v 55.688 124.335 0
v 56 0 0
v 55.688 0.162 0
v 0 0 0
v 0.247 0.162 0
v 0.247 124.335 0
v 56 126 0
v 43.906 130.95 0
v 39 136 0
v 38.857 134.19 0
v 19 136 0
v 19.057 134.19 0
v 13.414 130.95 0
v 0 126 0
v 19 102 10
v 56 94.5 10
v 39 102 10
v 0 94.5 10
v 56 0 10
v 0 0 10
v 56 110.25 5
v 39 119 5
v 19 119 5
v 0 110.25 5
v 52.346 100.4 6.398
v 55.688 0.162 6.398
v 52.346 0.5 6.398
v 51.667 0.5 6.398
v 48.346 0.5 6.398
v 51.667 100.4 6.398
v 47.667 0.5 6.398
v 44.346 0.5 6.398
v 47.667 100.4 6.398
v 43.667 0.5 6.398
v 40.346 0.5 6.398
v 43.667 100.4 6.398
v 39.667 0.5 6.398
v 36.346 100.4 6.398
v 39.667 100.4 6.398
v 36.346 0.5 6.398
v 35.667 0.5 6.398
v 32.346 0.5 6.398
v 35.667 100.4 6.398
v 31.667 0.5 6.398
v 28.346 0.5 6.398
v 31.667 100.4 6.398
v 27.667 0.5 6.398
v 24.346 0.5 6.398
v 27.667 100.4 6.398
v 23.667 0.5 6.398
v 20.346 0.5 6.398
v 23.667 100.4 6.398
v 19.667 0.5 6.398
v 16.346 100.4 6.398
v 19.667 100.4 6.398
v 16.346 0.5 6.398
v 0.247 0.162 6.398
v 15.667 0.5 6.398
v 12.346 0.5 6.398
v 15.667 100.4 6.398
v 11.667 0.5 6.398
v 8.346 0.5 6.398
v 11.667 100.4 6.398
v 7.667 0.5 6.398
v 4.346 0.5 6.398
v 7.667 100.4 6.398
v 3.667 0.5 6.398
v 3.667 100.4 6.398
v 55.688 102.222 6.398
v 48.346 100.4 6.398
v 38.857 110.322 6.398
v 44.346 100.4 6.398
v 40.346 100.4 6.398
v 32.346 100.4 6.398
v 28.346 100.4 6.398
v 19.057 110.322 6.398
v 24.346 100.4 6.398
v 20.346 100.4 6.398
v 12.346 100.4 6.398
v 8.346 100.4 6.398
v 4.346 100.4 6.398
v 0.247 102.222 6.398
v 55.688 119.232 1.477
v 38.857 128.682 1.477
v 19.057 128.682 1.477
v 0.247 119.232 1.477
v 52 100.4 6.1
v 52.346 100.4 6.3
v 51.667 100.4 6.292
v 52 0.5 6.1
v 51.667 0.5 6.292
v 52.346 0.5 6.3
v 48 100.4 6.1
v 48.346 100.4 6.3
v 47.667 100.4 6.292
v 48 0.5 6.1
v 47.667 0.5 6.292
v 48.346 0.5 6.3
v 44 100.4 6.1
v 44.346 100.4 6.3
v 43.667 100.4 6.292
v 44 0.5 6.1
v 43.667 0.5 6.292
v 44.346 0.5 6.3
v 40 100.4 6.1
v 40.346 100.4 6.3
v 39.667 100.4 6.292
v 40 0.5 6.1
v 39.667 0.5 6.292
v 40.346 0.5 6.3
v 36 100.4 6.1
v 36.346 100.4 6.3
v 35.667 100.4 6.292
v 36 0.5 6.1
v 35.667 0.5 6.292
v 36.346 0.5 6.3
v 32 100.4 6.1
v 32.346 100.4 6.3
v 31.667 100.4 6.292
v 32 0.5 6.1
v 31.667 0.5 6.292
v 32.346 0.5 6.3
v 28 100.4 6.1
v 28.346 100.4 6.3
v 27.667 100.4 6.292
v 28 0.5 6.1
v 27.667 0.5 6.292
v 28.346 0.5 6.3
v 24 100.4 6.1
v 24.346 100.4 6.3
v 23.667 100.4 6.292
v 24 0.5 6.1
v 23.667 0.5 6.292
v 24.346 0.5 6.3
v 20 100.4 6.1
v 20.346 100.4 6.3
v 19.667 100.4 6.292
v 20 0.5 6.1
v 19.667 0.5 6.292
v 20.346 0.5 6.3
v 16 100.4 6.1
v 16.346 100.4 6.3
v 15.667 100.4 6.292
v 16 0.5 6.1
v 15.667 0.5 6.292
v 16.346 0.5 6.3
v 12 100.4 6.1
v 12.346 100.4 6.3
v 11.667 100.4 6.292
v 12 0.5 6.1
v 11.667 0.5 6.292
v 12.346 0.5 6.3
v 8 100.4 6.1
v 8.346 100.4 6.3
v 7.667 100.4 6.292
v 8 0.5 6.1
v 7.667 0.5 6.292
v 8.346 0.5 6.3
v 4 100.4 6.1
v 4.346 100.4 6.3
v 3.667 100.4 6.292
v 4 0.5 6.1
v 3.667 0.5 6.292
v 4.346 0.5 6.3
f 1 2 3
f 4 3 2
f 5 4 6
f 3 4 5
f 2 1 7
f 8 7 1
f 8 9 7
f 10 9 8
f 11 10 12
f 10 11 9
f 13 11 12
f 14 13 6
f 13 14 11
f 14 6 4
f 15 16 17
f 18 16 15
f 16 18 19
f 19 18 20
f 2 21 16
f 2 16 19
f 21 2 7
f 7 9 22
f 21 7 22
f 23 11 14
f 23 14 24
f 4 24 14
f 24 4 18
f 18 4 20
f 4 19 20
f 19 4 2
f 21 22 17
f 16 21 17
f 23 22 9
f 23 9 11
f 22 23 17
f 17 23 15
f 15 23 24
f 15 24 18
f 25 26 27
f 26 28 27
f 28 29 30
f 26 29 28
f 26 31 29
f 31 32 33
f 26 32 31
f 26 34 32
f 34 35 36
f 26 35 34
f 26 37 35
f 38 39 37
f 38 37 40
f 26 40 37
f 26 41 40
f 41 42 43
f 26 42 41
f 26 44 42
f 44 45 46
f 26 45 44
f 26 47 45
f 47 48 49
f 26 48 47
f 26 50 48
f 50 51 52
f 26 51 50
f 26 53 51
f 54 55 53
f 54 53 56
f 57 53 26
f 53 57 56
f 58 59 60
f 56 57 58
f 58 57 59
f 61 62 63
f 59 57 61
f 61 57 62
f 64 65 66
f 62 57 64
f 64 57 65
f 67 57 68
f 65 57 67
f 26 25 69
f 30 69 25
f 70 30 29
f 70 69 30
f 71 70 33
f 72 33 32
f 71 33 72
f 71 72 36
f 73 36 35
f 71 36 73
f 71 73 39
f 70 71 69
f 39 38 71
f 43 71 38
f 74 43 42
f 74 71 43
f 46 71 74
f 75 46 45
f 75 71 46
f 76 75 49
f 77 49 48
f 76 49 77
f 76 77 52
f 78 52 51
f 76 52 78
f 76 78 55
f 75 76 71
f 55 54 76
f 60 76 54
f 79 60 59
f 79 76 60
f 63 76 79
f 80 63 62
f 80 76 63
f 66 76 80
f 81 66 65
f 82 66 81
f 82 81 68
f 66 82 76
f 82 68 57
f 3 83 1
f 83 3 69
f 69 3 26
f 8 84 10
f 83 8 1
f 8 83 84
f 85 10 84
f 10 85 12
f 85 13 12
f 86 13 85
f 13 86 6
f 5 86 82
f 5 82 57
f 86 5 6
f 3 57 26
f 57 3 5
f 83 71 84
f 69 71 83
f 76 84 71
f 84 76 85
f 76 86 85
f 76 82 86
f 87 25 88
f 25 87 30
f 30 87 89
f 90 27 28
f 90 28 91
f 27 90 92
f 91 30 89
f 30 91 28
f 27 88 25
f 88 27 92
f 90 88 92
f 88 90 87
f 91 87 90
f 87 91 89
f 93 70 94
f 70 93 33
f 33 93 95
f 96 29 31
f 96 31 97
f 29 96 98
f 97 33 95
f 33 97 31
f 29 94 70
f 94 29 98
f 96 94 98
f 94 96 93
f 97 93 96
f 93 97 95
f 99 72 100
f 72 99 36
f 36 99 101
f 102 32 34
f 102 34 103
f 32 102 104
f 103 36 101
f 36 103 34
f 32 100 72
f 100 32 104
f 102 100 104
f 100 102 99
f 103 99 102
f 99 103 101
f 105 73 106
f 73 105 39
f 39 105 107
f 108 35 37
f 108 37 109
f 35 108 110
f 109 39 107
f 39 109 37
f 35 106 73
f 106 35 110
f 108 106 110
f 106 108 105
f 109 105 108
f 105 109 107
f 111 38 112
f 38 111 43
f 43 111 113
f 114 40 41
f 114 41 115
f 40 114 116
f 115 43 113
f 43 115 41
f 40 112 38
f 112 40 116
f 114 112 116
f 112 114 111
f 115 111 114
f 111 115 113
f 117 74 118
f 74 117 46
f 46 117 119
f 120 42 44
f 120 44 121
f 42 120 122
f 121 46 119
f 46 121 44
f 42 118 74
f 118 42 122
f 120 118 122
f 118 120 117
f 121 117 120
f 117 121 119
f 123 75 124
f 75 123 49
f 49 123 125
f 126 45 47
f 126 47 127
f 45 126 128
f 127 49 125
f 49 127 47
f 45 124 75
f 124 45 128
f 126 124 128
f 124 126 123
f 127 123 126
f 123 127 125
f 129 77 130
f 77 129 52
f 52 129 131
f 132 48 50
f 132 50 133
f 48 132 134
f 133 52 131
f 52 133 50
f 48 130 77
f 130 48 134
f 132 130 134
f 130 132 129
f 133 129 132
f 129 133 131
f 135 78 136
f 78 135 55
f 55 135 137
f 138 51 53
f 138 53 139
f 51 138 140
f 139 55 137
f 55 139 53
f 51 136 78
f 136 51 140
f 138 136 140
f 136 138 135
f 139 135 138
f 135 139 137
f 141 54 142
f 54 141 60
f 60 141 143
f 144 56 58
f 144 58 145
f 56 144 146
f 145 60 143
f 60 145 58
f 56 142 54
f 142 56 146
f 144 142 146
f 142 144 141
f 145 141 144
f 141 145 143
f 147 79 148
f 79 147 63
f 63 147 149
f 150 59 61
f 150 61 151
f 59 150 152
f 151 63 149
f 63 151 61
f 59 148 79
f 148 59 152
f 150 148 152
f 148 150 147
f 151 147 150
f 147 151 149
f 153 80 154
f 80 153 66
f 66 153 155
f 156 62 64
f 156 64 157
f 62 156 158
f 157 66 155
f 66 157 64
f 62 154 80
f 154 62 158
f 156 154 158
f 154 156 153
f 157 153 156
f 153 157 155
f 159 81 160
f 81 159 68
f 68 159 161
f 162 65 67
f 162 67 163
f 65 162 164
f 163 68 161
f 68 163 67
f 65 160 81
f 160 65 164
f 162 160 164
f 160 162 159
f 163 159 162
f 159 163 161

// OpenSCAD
// file: mcad/units.scad
/*
 * Basic units.
 *
 * Originally by Hans Häggström, 2010.
 * Dual licenced under Creative Commons Attribution-Share Alike 3.0 and LGPL2 or later
 */


mm = 1;
cm = 10 * mm;
dm = 100 * mm;
m = 1000 * mm;

inch = 25.4 * mm;

X = [1, 0, 0];
Y = [0, 1, 0];
Z = [0, 0, 1];

M3 = 3*mm;
M4 = 4*mm;
M5 = 5*mm;
M6 = 6*mm;
M8 = 8*mm;


// When a small distance is needed to overlap shapes for boolean cutting, etc.
epsilon = 0.01*mm;

phi=0.5*(sqrt(5) + 1 );
// file: mcad/utilities.scad
/*
 * Utility functions.
 *
 * Originally by Hans Häggström, 2010.
 * Dual licenced under Creative Commons Attribution-Share Alike 3.0 and LGPL2 or later
 */

include <units.scad>

function squ(a) = a * a;

// Takes 2 3d vectors and returns
// the square root of
//   the summation of
//     the squares of
//       the diffs of
// cooresponding coordinates from each vector.
function distance(a, b) = sqrt(
  squ(a[0] - b[0]) + // (a[0] - b[0])² +
  squ(a[1] - b[1]) + // (a[1] - b[1])² +
  squ(a[2] - b[2])   // (a[2] - b[2])² =
);

// Takes 1 2d vector
function length2(a) = sqrt( squ(a[0]) + squ(a[1]) );

// max is used to handle rounding errors in division by 0

function normalized(a) = a / (max(distance([0,0,0], a), 0.00001));

function normalized_axis(a) = a == "x" ? [1, 0, 0]:
                   a == "y" ? [0, 1, 0]:
                   a == "z" ? [0, 0, 1]: normalized(a);

function angleOfNormalizedVector(n) = [0, -atan2(n[2], length2([n[0], n[1]])), atan2(n[1], n[0]) ];

function angle(v) = angleOfNormalizedVector(normalized(v));

function angleBetweenTwoPoints(a, b) = angle(normalized(b-a));


CENTER = 0;
LEFT = -0.5;
RIGHT = 0.5;
TOP = 0.5;
BOTTOM = -0.5;

FlatCap =0;
ExtendedCap =0.5;
CutCap =-0.5;


module fromTo(from=[0,0,0], to=[1*m,0,0], size=[1*cm, 1*cm], align=[CENTER, CENTER], material=[0.5, 0.5, 0.5], name="", endExtras=[0,0], endCaps=[FlatCap, FlatCap], rotation=[0,0,0], printString=true) {

  angle = angleBetweenTwoPoints(from, to);
  length = distance(from, to) + endCaps[0]*size[0] + endCaps[1]*size[0] + endExtras[0] + endExtras[1];

  if (length > 0) {
    if (printString) echo(str("  " ,name, " ", size[0], "mm x ", size[1], "mm, length ",length,"mm"));

    color(material)
      translate(from)
        rotate(angle)
          translate( [ -endCaps[0]*size[0] - endExtras[0], size[0]*(-0.5-align[0]), size[1]*(-0.5+align[1]) ] )
            rotate(rotation)
              scale([length, size[0], size[1]]) children();
  }
}

module part(name) {
  echo("");
  echo(str(name, ":"));
}
// file: lineUp.scad
// lineUp uses children(0) to get the first child passed to the module
//+ to create a line-up.

function whichAxis(axis = "x") = [
  len(search("x", axis, 1)),
  len(search("y", axis, 1)),
  len(search("z", axis, 1))
];

module lineUp(num = 2, space = 1, axis = "x", offsetVector = [0,0,0]) {
// echo(num, space, whichAxis(axis));
  if (num > 1) {
      for (i = [0 : num - 1])
        translate(offsetVector + (whichAxis(axis) * (space * i))) children(0);
  } else {
    echo ("num must be positive but is :", num);
  }
}

// size = [10, 10, 10];
// lineUp(10, 10, "x  "){cube(size=size, center = true);}
// lineUp(10, 10, "  z"){cube(size=size, center = true);}
// lineUp(10, 10, " y "){cube(size=size, center = true);}
// lineUp(10, 10, "xy "){cube(size=size, center = true);}
// lineUp(10, 10, " yz"){cube(size=size, center = true);}
// lineUp(10, 10, "x z"){cube(size=size, center = true);}
// lineUp(10, 10, "xyz"){cube(size=size, center = true);}
// main file
use <lineUp.scad>
use <mcad/utilities.scad>

baseShapeHeight = 10;
origin = [0, 0];
common = [56, 126];
max_points = [56, 136];
cylinderHeight = 100;
cylinderD1 = 0.4;
cylinderD2 = 0.4;
spacing = 4;
numOfCylinders = 13;
rotationVector = [270, 90, 0];
translationVector = [-6.5, -spacing * numOfCylinders, 0];
$fa = 1;
$fs = 8;

nose_points = [
  [origin.x, common.y],
  common,
  [39, max_points.y],
  [19, max_points.y]
];

sq_points = [
  origin,
  [common.x, origin.y],
  common,
  [origin.x, common.y]
];

module baseShape(h = 0) {
  linear_extrude(
    slices = 2,
    twist = 0,
    height = baseShapeHeight + h,
    convexity = 3,
    scale = [1, 12/16]
  )
  union() {
    polygon(nose_points);
    polygon(sq_points);
  }
}

module binShape() {
  difference() {
    baseShape();
    scale([0.99, 1.08, 63/64])
    translate([0.25, 0.15, -3.5])
    baseShape();
  }
}

module mainShape() {
  union() {
    binShape();
    rotate(rotationVector) {
      lineUp(numOfCylinders, spacing, "y", translationVector) {
         intersection(){
           resize([0, 2, 0]) translate([0, -0.5, 0.5])
           cube(size = [cylinderD1, cylinderD2 * 1.5, cylinderHeight - 0.1], center = false);
           translate([0, 0, 0.5])
           cylinder(cylinderHeight - 0.1, cylinderD1, cylinderD2, $fn = 6);
        }
      }
    };
  }
}

mainShape();
